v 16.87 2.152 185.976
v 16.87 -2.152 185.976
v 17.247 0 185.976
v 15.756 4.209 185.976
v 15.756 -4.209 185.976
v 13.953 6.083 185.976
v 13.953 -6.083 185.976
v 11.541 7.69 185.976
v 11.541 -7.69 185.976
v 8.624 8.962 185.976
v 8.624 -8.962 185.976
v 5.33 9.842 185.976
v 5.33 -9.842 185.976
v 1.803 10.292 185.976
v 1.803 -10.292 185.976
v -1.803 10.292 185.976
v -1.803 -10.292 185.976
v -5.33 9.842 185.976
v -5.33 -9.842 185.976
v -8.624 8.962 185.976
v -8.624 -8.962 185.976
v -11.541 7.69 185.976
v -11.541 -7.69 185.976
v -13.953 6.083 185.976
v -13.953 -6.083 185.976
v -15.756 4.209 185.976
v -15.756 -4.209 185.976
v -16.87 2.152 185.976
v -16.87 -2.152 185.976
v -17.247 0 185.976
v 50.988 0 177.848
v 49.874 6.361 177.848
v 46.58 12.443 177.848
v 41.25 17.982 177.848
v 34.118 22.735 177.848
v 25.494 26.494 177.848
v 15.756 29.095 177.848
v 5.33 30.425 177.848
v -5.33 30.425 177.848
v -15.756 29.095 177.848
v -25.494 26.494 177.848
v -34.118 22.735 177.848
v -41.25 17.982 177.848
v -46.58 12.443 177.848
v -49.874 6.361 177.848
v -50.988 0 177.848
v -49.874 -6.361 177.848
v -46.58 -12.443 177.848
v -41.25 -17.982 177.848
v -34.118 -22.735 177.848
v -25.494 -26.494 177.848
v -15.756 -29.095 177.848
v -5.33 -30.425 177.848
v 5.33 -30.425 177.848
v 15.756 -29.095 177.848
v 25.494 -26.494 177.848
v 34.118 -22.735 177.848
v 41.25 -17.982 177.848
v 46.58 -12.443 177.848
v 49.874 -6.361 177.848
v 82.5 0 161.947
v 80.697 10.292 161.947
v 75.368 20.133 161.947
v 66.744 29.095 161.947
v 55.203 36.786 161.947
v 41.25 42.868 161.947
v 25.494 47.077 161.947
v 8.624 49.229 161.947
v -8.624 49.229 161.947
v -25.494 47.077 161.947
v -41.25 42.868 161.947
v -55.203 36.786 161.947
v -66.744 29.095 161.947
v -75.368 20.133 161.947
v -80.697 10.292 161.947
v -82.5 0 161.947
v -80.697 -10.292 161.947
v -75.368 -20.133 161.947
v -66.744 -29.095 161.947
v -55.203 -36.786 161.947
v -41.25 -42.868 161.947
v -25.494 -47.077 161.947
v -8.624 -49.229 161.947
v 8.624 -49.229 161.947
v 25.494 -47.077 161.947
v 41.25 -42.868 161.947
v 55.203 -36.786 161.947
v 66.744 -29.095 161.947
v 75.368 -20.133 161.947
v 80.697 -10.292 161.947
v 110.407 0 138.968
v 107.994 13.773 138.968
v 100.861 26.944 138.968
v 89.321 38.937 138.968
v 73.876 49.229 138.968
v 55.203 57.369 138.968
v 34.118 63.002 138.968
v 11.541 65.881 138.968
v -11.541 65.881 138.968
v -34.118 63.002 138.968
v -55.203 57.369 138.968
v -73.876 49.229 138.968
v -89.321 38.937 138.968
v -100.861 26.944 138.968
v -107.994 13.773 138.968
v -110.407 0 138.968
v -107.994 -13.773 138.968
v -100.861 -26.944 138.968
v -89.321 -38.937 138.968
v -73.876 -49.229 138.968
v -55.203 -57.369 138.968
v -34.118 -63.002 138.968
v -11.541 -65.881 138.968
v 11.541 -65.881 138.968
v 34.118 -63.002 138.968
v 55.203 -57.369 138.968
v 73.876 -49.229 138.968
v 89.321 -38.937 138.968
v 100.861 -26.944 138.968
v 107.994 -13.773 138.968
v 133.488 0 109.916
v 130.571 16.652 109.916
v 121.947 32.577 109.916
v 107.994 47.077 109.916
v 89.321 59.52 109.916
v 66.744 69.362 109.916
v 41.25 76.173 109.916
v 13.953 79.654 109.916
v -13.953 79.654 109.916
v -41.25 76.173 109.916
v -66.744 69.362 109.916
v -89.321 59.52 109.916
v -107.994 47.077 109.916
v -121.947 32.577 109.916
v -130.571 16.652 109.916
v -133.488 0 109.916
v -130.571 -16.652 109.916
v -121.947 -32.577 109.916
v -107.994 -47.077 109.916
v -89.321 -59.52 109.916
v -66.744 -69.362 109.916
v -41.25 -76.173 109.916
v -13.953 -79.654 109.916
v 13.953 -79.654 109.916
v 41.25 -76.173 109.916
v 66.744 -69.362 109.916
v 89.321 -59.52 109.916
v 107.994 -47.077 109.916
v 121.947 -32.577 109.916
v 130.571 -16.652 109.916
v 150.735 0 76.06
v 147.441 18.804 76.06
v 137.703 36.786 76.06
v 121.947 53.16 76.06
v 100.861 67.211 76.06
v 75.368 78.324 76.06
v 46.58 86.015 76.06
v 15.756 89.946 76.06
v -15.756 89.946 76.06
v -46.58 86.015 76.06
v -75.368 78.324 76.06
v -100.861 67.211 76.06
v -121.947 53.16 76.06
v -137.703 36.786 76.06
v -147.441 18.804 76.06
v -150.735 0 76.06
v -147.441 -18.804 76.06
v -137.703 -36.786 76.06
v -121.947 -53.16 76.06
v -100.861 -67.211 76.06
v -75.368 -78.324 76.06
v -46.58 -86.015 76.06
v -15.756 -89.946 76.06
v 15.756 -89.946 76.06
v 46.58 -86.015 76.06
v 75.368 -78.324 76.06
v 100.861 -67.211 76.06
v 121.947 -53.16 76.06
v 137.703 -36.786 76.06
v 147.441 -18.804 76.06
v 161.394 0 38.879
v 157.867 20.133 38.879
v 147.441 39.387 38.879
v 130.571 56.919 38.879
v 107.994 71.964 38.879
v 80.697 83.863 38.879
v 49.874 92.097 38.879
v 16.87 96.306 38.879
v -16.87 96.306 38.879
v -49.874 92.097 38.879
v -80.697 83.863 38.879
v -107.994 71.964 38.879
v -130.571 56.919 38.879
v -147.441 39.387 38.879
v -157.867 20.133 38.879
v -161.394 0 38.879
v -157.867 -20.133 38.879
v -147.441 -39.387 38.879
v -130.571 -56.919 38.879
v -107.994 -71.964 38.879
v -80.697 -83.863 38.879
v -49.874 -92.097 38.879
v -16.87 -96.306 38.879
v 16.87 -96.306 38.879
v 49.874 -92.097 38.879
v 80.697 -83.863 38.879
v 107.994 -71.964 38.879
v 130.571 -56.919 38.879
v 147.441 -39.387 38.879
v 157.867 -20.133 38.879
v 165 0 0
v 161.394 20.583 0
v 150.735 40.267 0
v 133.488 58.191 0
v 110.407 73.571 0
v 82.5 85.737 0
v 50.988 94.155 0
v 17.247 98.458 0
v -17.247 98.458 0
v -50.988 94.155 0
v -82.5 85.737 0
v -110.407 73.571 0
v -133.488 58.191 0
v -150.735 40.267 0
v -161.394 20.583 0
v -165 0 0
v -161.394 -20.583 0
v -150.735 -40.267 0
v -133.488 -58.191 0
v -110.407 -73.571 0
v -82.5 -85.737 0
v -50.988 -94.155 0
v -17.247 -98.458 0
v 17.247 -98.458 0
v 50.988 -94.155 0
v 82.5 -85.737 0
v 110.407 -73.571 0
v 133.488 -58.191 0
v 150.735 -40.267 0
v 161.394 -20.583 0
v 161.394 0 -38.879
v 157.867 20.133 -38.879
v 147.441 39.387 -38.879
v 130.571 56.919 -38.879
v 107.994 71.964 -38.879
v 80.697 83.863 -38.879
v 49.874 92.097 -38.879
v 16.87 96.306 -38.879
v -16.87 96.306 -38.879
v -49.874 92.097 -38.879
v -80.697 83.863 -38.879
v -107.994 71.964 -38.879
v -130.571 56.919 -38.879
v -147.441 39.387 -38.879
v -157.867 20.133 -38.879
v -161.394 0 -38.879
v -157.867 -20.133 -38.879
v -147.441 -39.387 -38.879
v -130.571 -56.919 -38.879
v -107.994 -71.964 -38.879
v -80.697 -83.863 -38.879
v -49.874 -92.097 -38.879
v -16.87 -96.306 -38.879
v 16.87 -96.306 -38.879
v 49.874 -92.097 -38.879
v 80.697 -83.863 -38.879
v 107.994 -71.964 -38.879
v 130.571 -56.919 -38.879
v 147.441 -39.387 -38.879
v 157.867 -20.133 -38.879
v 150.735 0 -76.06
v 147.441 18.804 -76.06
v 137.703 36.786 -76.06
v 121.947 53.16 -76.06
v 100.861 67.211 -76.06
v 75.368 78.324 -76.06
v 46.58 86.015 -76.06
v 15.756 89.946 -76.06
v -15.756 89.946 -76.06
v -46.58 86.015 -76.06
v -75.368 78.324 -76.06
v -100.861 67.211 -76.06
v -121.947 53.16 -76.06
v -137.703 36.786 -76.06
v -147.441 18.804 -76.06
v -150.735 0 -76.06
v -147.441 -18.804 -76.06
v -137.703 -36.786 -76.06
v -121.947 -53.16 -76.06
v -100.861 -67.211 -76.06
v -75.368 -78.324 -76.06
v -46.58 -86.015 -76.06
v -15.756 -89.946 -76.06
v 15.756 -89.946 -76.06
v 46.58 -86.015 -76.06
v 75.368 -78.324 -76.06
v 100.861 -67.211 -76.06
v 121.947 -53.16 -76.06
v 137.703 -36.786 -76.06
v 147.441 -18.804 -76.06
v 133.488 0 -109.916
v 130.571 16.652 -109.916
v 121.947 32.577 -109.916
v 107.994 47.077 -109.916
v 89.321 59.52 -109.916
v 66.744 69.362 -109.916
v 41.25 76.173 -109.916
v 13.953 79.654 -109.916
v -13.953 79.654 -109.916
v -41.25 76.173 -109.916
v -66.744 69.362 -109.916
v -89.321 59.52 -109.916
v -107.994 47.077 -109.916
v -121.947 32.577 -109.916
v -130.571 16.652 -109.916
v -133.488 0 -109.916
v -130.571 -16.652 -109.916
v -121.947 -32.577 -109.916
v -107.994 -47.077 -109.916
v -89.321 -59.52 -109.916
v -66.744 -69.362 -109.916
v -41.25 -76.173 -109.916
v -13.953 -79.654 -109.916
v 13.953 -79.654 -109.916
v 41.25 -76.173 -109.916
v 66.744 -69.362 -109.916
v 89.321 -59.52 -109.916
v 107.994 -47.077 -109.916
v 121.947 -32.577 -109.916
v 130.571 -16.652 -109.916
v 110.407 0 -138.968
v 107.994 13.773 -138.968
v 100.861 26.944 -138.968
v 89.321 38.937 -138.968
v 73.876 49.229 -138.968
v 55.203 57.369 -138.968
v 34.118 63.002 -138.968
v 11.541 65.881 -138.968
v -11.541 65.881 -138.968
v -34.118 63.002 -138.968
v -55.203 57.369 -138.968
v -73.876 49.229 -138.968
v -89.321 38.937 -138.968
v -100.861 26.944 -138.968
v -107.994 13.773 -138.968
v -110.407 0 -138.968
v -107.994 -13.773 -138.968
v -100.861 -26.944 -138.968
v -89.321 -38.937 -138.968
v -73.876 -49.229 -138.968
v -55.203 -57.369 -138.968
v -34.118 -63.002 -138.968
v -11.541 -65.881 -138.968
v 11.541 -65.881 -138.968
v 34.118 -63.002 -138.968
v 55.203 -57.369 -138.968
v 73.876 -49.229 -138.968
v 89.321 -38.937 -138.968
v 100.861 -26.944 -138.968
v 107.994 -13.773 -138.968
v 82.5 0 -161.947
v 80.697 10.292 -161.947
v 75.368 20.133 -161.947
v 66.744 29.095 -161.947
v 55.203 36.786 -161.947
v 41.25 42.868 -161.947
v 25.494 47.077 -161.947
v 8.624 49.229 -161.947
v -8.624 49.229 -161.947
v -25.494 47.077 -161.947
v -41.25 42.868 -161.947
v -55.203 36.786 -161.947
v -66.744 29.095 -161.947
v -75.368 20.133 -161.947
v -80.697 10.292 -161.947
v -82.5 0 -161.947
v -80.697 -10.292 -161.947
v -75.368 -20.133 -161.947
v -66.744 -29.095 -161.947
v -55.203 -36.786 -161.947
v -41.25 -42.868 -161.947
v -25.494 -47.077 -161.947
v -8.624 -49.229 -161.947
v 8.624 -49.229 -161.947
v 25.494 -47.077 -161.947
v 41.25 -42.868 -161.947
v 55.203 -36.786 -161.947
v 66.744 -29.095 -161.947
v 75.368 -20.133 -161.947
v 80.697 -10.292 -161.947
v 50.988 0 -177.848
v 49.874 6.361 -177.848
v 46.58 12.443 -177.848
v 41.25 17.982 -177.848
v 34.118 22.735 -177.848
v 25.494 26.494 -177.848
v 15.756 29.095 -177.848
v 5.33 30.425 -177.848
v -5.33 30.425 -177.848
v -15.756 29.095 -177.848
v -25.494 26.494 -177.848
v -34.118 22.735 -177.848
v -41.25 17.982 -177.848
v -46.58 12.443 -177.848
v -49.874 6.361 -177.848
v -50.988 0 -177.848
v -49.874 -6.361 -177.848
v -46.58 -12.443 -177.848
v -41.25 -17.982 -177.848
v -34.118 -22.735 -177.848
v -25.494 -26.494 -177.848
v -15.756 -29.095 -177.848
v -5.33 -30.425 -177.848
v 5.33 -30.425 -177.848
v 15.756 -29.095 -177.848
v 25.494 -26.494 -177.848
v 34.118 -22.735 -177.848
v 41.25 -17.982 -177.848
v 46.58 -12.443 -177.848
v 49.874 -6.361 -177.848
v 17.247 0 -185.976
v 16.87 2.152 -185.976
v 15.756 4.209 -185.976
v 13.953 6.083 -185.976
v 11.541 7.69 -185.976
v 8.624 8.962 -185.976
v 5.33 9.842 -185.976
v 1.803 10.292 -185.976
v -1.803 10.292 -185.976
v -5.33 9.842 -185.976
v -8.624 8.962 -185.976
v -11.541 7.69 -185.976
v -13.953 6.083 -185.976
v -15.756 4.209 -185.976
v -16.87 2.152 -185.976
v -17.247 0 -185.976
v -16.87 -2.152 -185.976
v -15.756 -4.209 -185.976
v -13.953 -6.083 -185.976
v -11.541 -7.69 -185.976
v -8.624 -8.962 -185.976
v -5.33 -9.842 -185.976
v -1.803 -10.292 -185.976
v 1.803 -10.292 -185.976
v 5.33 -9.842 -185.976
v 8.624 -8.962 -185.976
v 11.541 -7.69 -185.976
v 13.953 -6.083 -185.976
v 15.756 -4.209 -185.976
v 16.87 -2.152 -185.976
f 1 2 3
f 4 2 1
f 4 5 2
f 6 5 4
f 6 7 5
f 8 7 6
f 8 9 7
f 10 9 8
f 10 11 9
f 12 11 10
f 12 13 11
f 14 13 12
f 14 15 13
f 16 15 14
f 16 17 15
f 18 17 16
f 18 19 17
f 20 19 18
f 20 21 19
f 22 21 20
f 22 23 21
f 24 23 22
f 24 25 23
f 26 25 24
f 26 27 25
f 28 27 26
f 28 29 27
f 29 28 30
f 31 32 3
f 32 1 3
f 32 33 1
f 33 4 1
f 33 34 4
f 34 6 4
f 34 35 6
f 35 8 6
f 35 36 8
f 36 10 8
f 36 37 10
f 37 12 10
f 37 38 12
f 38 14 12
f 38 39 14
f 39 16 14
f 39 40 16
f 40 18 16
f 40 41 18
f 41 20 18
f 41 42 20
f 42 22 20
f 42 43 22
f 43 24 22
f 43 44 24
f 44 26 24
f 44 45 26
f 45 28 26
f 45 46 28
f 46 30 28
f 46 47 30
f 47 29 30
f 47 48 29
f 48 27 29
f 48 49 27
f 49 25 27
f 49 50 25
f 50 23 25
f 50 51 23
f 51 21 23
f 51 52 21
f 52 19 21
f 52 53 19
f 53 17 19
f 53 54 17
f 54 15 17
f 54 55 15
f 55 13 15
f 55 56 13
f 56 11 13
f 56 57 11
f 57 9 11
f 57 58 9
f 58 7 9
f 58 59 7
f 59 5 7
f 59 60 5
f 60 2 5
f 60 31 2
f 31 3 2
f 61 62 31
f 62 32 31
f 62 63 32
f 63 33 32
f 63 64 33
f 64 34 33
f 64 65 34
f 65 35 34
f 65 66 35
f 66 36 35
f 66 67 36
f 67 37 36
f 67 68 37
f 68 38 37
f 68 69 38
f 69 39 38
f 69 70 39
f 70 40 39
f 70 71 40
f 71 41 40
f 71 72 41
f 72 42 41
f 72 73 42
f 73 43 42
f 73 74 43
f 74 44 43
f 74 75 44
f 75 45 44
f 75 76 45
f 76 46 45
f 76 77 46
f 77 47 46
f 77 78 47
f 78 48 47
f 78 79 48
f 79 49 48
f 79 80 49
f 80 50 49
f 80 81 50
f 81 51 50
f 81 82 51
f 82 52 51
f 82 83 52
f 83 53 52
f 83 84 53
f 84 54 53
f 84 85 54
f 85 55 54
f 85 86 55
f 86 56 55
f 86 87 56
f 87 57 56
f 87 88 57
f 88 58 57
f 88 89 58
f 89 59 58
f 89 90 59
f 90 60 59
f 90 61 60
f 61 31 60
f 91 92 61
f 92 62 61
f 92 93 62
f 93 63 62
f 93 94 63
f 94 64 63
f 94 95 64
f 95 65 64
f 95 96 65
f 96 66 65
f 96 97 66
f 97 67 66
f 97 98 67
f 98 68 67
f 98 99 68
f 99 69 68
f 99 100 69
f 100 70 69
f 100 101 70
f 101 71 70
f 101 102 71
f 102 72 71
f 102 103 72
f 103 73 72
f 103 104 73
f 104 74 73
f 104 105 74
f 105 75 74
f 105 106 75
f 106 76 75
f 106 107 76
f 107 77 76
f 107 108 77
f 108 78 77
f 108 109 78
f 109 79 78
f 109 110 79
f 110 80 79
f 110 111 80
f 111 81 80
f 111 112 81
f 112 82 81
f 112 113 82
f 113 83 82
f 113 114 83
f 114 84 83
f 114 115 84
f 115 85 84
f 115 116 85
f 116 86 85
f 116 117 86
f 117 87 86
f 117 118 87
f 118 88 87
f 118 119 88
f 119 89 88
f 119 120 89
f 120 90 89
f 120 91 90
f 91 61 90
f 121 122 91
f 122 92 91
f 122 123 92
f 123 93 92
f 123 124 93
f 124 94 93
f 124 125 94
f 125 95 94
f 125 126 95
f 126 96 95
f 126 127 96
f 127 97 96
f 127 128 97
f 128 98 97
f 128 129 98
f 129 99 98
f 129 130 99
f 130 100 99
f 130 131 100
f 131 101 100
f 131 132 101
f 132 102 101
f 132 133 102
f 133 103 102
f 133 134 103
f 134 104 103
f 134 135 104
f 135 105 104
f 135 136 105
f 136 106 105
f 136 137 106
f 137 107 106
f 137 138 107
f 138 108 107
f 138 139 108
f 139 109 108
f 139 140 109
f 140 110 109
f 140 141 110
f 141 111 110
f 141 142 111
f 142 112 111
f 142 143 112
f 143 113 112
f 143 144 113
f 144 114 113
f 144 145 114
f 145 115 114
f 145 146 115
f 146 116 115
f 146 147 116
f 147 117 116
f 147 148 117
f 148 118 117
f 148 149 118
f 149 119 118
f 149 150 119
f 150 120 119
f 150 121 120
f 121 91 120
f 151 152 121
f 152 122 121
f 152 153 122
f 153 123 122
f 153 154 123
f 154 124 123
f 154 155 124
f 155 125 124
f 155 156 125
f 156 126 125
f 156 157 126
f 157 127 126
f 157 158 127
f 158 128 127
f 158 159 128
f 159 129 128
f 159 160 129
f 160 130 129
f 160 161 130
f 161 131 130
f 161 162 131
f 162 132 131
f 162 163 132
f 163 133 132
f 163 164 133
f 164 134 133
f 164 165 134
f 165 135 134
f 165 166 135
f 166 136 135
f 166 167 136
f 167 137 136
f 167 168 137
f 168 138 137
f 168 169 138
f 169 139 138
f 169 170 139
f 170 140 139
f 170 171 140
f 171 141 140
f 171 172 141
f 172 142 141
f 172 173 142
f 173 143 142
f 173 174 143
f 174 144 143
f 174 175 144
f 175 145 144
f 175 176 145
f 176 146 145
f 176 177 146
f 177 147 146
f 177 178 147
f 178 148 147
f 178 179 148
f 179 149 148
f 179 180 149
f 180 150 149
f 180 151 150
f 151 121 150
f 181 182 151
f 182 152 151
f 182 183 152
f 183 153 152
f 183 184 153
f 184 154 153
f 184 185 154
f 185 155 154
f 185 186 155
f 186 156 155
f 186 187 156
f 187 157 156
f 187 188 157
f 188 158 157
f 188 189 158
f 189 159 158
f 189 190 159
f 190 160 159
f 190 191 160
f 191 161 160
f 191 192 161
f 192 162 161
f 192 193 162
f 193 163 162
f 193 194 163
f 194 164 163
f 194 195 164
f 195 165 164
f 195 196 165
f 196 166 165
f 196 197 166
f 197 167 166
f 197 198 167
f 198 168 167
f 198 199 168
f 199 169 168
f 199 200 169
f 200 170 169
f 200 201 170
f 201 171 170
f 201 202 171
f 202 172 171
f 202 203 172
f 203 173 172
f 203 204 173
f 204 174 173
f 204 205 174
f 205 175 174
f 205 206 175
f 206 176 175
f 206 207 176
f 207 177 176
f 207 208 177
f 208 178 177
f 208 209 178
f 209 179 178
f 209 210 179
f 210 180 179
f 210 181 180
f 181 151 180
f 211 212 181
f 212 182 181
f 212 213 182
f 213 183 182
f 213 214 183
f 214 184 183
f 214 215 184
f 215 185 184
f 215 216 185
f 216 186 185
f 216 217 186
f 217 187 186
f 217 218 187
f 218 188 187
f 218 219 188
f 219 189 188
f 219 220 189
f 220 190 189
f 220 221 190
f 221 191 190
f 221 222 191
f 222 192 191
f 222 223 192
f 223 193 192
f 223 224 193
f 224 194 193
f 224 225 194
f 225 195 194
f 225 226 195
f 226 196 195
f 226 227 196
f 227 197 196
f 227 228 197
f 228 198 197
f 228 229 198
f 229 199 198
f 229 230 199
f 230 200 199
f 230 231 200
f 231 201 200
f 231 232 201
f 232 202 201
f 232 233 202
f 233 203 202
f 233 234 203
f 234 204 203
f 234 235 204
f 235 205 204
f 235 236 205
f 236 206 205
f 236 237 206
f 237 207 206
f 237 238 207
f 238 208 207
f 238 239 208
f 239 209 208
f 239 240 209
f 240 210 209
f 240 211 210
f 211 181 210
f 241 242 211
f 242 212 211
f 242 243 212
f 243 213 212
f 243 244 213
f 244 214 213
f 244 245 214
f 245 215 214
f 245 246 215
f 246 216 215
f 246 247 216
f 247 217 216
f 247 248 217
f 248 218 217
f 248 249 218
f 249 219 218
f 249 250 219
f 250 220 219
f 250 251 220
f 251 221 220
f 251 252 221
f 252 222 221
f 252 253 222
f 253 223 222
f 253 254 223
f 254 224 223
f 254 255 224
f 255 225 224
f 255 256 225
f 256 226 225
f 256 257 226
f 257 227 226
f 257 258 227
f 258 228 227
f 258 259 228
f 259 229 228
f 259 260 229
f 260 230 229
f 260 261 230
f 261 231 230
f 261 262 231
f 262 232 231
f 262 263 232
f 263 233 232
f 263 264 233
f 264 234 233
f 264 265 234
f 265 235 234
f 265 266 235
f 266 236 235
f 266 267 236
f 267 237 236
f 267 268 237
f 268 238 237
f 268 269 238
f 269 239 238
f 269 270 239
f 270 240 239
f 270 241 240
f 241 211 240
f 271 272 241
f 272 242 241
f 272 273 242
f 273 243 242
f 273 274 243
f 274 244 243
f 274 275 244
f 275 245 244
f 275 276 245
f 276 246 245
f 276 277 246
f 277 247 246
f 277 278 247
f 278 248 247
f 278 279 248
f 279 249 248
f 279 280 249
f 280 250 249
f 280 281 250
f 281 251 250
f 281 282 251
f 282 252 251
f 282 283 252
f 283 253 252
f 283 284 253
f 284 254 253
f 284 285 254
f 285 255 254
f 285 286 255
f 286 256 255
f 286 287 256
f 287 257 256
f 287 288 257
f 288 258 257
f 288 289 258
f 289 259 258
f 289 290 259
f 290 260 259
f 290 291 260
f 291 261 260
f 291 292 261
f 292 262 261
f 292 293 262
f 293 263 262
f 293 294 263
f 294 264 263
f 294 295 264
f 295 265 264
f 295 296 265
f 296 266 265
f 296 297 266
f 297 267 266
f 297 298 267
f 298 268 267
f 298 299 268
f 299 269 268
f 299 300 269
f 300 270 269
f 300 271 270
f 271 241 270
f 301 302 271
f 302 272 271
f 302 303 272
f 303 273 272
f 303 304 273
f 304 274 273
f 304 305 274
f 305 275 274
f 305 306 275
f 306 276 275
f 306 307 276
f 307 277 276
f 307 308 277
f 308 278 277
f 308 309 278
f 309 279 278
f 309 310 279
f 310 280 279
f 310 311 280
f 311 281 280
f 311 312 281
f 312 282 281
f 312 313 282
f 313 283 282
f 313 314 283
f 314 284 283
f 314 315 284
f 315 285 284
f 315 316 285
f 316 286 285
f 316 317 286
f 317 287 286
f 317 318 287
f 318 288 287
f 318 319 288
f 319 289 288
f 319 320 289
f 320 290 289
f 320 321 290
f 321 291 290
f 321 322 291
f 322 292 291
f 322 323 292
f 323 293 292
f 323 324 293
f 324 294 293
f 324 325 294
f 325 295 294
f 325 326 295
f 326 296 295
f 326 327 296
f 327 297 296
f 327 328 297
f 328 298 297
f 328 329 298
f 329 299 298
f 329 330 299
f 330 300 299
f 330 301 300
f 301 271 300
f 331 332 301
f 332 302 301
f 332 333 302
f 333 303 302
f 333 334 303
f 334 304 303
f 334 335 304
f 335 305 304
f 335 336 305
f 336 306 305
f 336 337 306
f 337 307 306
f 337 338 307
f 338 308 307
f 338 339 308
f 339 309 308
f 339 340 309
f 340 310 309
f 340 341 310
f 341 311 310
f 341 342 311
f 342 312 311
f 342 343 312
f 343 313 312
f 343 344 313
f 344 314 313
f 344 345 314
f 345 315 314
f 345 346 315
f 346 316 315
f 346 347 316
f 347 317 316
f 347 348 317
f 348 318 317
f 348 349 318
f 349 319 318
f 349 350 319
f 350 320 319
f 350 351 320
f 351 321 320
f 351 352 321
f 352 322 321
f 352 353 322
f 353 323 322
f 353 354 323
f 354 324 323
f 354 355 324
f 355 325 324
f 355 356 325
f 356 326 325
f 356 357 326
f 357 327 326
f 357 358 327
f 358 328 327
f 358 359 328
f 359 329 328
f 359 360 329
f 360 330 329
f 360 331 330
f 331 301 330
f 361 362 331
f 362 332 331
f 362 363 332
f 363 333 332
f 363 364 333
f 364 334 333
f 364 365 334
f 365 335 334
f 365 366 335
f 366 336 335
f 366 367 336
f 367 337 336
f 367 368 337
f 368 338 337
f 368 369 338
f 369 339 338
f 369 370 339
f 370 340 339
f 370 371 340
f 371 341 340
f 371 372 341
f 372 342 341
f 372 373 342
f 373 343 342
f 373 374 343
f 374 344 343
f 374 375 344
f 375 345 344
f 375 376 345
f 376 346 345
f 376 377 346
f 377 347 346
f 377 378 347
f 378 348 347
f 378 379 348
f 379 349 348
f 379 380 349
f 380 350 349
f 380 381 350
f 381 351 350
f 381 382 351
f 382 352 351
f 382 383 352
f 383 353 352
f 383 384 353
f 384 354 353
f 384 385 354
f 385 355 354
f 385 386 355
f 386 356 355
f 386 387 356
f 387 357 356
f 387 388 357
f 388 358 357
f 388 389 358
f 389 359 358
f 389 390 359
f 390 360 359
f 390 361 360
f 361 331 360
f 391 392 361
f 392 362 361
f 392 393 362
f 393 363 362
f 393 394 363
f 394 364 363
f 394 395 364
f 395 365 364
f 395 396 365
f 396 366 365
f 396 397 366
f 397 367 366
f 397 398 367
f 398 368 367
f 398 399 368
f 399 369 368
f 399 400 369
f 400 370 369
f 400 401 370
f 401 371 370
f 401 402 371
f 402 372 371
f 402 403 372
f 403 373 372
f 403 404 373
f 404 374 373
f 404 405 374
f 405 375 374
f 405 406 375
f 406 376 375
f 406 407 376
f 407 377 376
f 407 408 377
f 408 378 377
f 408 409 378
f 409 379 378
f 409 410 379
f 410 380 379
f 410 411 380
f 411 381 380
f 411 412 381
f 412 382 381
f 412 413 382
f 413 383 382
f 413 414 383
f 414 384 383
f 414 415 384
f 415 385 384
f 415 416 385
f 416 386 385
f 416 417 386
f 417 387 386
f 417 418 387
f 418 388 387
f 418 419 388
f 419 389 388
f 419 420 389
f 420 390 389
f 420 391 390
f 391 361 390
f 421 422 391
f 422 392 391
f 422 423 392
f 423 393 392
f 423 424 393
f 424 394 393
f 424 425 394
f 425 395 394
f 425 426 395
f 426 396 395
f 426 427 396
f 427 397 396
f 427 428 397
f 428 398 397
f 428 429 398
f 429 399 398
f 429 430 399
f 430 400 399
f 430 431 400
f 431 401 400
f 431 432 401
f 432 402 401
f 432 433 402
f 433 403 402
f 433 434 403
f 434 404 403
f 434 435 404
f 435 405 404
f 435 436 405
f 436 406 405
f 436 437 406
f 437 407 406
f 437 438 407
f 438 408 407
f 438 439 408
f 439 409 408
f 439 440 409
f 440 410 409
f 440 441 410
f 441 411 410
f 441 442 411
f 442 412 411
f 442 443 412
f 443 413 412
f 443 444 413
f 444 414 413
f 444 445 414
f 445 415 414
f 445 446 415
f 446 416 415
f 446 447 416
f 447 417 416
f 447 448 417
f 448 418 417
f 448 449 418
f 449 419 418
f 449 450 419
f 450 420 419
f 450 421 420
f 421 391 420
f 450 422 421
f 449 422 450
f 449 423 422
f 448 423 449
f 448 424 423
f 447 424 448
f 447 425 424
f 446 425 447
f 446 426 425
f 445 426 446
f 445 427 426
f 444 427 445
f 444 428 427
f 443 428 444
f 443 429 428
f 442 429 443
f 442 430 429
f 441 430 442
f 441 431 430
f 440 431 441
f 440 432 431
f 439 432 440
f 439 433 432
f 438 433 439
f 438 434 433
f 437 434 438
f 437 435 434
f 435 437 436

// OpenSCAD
// Generated by SolidPython 1.0.1 on 2020-07-29 00:46:52


scale(v = [15, 9, 17]) {
	sphere(r = 11);
}
/***********************************************
*********      SolidPython code:      **********
************************************************
 
# import packages: SolidPython
from solid import *
from solid.utils import *
from itertools import chain, combinations, permutations


class Resize:

    def __init__(self, scad_file):
        self.scad_file = scad_file
        #self.scad_file = import_scad(scad_file)
        # cone/cylinder param:
        self.r1 = 0
        self.r2 = 0
        self.h = 0
        # rectangular prism param:
        self.w = 0
        self.l = 0
        # ellipse param:
        self.r = 0

    # import OpenScad code (file name corresponds to shape)


    # classify shape + parameters
    def assign(self, param1, param2, param3):
        if self.scad_file == 'cone.scad':
            self.r1 = param1
            self.r2 = param2
            self.h = param3
        elif self.scad_file == 'cylinder.scad':
            self.r1 = param1
            self.r2 = param2
            self.h = param3
        elif self.scad_file == 'rectangularPrism.scad':
            self.h = param1
            self.l = param2
            self.w = param3
        else:
            self.r = param1
            self.h = param2

    # resize parameters
    def iterate(self):
        x = range(3, 20, 2)
        i = 1
        if self.scad_file == 'cone.scad':
            tempList = list(permutations(x, 2))
            for temp in tempList:
                param1 = temp[0]
                param2 = temp[1]
                filepath = 'produced_scad_files/' + 'cone' + str(param1) + '_' + str(param2) + '_' + '.scad'
                scad_render_to_file(cylinder(h=param1, r1=param2, r2=0), filepath)

        elif self.scad_file == 'cylinder.scad':
            tempList = list(permutations(x, 3))
            for temp in tempList:
                param1 = temp[0]
                param2 = temp[1]
                filepath = 'produced_scad_files/' + 'cylinder' + str(param1) + '_' + str(param2) + '_' + '.scad'
                scad_render_to_file(cylinder(h=param1, r1=param2, r2=param2), filepath)

        elif self.scad_file == 'rectangularPrism.scad':
            tempList = list(permutations(x, 3))
            for temp in tempList:
                param1 = temp[0]
                param2 = temp[1]
                param3 = temp[2]
                filepath = 'produced_scad_files/' + 'rectangularPrism' + str(param1) + '_' + str(param2) + '_' + str(
                    param3) + '.scad'
                scad_render_to_file(cube(size=(param1, param2, param3)), filepath)

        elif self.scad_file == 'ellipse.scad':
            tempList = list(permutations(x, 4))
            for temp in tempList:
                param1 = temp[0]
                param2 = temp[1]
                param3 = temp[2]
                param4 = temp[3]
                filepath = 'produced_scad_files/' + 'ellipse' + str(param1) + '_' + str(param2) + '_' + str(param3) + '_' + str(param4) + '.scad'
                scad_render_to_file(scale([param1, param2, param3])(sphere(r=param4)), filepath)

    def render_to_scadfile(self):
        scad_render_to_file(scad, 'example.scad') 
 
************************************************/
